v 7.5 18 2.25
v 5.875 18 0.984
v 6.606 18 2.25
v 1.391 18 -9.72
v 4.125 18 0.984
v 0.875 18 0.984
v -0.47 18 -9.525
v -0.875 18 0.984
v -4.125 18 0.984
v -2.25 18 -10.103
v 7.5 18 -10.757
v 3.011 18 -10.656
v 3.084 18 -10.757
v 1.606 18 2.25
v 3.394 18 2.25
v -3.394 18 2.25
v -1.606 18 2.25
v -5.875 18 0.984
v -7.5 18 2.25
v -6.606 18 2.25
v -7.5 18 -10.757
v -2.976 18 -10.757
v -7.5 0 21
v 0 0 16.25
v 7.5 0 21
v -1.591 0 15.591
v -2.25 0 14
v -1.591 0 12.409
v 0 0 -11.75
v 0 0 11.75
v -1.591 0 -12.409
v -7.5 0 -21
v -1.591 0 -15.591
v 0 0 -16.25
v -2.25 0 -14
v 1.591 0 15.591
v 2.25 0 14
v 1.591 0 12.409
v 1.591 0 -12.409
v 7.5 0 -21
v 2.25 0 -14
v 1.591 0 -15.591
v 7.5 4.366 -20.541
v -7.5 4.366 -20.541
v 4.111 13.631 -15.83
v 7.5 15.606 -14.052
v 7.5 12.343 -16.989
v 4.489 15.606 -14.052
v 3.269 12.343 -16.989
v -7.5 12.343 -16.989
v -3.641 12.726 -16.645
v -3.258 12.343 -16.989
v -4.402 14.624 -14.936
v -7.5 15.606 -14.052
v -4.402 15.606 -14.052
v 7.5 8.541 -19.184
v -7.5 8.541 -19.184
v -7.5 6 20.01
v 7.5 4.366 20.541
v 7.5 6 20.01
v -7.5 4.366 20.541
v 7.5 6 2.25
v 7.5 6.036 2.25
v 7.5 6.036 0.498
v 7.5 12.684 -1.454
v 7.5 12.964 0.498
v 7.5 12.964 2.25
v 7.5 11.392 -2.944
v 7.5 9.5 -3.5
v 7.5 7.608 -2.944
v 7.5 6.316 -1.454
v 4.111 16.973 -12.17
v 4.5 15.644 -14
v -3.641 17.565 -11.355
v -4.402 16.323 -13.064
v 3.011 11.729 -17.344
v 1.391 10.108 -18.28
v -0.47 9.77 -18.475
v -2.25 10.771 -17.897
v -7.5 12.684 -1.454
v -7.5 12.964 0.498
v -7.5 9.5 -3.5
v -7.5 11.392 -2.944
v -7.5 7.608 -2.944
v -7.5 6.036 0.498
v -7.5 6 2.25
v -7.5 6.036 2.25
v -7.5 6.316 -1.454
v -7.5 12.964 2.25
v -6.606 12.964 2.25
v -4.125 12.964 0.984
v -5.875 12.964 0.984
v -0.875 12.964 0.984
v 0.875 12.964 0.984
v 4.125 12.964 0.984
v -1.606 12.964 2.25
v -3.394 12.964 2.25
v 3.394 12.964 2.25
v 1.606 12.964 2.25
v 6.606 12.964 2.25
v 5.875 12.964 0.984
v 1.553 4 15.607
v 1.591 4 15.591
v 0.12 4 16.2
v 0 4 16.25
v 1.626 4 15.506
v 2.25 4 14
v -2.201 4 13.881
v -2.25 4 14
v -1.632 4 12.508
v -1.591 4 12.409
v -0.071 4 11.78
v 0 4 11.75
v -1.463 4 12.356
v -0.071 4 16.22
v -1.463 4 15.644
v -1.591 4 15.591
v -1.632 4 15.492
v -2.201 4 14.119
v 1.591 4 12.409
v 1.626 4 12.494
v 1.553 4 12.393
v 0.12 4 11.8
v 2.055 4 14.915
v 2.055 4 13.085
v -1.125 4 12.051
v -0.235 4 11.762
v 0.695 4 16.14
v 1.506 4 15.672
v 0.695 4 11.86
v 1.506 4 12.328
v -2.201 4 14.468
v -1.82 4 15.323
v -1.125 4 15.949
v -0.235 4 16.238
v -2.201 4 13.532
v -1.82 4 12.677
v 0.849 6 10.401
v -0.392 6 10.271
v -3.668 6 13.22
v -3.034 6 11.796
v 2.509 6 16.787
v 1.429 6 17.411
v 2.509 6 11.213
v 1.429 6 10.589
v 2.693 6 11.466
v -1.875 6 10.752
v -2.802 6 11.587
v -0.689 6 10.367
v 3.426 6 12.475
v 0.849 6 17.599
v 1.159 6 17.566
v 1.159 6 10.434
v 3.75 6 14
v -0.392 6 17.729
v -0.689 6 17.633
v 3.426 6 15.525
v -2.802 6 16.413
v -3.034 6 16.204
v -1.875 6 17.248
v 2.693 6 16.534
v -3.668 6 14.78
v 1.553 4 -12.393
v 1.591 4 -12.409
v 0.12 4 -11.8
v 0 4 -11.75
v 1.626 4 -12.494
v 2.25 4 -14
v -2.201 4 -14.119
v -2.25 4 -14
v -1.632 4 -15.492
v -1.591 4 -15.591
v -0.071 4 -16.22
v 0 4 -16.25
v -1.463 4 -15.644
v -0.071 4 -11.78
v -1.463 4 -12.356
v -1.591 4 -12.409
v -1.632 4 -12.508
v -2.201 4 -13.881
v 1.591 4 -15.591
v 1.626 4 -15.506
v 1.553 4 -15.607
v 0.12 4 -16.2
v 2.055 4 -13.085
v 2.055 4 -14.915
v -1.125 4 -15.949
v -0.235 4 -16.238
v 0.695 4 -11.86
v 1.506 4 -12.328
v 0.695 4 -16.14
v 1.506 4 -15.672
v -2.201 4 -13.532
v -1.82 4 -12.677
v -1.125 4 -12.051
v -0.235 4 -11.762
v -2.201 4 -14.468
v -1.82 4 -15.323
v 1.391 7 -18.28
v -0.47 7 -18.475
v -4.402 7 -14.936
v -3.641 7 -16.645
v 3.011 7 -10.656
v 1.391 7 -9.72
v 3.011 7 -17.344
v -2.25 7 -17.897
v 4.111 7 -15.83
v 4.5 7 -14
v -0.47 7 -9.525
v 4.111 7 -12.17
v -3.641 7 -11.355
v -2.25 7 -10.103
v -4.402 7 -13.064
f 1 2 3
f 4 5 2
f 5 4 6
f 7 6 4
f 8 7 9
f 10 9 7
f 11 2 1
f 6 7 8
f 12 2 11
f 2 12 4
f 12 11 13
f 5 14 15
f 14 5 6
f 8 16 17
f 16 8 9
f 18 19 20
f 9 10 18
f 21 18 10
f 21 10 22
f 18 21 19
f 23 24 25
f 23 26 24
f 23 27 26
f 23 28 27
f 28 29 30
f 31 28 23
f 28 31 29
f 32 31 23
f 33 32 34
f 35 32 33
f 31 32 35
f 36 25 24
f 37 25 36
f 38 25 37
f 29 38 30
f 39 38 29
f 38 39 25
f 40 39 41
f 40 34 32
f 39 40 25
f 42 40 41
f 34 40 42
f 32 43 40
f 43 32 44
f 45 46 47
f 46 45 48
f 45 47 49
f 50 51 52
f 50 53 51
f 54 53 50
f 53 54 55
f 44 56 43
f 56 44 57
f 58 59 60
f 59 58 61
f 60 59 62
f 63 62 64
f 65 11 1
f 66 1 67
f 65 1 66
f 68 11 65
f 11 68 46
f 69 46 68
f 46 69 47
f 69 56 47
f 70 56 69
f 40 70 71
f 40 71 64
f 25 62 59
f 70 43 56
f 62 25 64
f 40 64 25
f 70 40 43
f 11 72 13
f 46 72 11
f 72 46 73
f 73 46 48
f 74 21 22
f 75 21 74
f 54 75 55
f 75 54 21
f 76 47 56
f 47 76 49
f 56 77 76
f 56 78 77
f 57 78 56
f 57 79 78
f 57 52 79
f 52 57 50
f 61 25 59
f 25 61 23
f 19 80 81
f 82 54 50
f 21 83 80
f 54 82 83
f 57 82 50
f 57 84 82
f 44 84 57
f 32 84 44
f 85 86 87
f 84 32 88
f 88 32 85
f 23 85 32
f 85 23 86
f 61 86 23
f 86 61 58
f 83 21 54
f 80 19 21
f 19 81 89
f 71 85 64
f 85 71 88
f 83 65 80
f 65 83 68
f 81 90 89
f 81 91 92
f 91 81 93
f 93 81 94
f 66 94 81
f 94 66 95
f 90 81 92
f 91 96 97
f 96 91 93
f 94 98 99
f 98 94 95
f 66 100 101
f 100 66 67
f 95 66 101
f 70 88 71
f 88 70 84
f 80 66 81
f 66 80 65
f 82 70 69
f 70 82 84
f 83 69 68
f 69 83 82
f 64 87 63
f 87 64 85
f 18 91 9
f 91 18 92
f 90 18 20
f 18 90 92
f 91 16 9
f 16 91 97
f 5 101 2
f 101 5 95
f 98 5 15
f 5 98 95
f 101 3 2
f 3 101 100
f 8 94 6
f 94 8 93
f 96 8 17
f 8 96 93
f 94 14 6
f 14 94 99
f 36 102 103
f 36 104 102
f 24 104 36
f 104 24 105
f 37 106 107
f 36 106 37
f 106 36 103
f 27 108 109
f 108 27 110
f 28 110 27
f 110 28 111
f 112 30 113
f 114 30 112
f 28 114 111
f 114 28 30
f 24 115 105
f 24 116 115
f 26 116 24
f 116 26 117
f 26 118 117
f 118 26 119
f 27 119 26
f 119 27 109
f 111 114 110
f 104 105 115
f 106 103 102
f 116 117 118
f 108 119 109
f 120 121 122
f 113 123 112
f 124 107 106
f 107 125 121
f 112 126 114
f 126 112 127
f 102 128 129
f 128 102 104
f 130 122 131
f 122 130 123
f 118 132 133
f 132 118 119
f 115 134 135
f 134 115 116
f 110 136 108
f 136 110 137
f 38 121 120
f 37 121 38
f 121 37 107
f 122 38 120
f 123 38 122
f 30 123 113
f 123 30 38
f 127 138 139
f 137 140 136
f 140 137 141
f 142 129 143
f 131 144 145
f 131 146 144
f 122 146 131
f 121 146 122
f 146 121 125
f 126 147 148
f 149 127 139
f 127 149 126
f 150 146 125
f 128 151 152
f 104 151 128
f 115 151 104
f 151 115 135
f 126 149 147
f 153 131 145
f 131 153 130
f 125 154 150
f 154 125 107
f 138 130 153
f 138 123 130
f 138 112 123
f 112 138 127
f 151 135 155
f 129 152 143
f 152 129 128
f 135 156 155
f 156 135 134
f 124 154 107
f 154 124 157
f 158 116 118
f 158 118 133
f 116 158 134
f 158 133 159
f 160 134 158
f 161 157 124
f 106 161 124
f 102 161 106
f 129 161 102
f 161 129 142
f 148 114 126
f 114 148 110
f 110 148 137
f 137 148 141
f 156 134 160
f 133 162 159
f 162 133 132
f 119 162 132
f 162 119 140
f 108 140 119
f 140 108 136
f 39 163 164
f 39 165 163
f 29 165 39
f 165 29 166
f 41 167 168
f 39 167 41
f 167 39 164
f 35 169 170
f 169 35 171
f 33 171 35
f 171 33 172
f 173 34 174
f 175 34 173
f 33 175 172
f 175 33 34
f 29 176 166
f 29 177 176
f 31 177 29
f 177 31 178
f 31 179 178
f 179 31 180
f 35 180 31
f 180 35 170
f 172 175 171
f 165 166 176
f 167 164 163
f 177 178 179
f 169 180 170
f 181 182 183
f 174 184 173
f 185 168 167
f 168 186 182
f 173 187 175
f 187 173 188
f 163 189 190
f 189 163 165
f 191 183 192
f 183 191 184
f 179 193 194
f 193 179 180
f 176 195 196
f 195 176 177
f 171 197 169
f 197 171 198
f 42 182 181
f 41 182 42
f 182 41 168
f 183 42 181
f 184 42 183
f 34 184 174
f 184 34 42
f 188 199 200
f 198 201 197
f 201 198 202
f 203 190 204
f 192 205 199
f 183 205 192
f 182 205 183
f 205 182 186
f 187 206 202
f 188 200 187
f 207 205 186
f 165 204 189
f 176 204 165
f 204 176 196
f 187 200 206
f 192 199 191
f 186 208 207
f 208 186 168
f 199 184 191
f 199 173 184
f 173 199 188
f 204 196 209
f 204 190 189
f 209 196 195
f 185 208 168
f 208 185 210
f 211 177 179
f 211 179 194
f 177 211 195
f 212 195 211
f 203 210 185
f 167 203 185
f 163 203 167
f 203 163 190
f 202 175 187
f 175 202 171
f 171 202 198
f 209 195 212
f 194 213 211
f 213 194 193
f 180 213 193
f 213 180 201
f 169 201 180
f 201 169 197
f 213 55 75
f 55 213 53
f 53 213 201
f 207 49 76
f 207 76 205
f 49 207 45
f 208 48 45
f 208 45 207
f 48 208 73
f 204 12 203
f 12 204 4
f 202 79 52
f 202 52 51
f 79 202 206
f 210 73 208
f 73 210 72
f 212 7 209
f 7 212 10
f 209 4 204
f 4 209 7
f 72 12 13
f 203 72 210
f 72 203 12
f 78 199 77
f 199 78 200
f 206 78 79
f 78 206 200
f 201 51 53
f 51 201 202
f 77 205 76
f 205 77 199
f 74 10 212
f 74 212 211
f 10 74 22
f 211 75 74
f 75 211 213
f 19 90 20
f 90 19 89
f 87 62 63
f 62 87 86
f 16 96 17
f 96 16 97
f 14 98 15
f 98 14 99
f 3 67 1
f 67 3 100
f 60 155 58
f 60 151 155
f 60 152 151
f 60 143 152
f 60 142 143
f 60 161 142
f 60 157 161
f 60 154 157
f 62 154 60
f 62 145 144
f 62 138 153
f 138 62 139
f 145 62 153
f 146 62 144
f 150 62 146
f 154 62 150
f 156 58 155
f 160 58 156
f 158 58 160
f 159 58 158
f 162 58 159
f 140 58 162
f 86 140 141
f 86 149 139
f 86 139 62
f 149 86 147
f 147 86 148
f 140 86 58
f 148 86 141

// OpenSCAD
rackD = 7;
rackSpacing = 49.5 - 8.5;
hookWidth = 12;
hookThick = 8;


module rackWire() {
    rotate([0, 90, 0]) cylinder(d=rackD, h=100, center=true);
}
module rack() {
    hull() {
        translate([0, 6 + rackD/2, 0]) rackWire();
        translate([0, 6 + rackD/2, 20]) rackWire();
    }
    translate([-5, 57, rackD/2-1]) rotate([90, 0, 0]) cylinder(d=3.5, h=100, center=true);
    translate([5, 57, rackD/2-1]) rotate([90, 0, 0]) cylinder(d=3.5, h=100, center=true);
    translate([0, 57, rackD/2-1]) rotate([90, 0, 0]) cylinder(d=3.5, h=100, center=true);
}

module screw() {
    translate([0, 4, 0]) {
        rotate([90, 0, 0]) cylinder(d=4.5, h=100, center=false);
        rotate([-90, 0, 0]) cylinder(d1=4.5, d2=9, h=3, center=false);
        translate([0, 3, 0]) rotate([-90, 0, 0]) cylinder(d=9, h=100, center=false);
    }
}
module hook() {
    intersection() {
        translate([0, 9, 0]) cube(size=[35, 18, 45], center=true);
        rotate([0, 90, 0]) cylinder(r=21, h=15, center=true);
    }
}
difference() {
    hook();
    rack();
    translate([0, 10+6, 10+2.25]) cube(size=[40, 20, 20], center=true);
    translate([0, 0, 14])  screw();
    translate([0, 0, -14])  screw();
}
